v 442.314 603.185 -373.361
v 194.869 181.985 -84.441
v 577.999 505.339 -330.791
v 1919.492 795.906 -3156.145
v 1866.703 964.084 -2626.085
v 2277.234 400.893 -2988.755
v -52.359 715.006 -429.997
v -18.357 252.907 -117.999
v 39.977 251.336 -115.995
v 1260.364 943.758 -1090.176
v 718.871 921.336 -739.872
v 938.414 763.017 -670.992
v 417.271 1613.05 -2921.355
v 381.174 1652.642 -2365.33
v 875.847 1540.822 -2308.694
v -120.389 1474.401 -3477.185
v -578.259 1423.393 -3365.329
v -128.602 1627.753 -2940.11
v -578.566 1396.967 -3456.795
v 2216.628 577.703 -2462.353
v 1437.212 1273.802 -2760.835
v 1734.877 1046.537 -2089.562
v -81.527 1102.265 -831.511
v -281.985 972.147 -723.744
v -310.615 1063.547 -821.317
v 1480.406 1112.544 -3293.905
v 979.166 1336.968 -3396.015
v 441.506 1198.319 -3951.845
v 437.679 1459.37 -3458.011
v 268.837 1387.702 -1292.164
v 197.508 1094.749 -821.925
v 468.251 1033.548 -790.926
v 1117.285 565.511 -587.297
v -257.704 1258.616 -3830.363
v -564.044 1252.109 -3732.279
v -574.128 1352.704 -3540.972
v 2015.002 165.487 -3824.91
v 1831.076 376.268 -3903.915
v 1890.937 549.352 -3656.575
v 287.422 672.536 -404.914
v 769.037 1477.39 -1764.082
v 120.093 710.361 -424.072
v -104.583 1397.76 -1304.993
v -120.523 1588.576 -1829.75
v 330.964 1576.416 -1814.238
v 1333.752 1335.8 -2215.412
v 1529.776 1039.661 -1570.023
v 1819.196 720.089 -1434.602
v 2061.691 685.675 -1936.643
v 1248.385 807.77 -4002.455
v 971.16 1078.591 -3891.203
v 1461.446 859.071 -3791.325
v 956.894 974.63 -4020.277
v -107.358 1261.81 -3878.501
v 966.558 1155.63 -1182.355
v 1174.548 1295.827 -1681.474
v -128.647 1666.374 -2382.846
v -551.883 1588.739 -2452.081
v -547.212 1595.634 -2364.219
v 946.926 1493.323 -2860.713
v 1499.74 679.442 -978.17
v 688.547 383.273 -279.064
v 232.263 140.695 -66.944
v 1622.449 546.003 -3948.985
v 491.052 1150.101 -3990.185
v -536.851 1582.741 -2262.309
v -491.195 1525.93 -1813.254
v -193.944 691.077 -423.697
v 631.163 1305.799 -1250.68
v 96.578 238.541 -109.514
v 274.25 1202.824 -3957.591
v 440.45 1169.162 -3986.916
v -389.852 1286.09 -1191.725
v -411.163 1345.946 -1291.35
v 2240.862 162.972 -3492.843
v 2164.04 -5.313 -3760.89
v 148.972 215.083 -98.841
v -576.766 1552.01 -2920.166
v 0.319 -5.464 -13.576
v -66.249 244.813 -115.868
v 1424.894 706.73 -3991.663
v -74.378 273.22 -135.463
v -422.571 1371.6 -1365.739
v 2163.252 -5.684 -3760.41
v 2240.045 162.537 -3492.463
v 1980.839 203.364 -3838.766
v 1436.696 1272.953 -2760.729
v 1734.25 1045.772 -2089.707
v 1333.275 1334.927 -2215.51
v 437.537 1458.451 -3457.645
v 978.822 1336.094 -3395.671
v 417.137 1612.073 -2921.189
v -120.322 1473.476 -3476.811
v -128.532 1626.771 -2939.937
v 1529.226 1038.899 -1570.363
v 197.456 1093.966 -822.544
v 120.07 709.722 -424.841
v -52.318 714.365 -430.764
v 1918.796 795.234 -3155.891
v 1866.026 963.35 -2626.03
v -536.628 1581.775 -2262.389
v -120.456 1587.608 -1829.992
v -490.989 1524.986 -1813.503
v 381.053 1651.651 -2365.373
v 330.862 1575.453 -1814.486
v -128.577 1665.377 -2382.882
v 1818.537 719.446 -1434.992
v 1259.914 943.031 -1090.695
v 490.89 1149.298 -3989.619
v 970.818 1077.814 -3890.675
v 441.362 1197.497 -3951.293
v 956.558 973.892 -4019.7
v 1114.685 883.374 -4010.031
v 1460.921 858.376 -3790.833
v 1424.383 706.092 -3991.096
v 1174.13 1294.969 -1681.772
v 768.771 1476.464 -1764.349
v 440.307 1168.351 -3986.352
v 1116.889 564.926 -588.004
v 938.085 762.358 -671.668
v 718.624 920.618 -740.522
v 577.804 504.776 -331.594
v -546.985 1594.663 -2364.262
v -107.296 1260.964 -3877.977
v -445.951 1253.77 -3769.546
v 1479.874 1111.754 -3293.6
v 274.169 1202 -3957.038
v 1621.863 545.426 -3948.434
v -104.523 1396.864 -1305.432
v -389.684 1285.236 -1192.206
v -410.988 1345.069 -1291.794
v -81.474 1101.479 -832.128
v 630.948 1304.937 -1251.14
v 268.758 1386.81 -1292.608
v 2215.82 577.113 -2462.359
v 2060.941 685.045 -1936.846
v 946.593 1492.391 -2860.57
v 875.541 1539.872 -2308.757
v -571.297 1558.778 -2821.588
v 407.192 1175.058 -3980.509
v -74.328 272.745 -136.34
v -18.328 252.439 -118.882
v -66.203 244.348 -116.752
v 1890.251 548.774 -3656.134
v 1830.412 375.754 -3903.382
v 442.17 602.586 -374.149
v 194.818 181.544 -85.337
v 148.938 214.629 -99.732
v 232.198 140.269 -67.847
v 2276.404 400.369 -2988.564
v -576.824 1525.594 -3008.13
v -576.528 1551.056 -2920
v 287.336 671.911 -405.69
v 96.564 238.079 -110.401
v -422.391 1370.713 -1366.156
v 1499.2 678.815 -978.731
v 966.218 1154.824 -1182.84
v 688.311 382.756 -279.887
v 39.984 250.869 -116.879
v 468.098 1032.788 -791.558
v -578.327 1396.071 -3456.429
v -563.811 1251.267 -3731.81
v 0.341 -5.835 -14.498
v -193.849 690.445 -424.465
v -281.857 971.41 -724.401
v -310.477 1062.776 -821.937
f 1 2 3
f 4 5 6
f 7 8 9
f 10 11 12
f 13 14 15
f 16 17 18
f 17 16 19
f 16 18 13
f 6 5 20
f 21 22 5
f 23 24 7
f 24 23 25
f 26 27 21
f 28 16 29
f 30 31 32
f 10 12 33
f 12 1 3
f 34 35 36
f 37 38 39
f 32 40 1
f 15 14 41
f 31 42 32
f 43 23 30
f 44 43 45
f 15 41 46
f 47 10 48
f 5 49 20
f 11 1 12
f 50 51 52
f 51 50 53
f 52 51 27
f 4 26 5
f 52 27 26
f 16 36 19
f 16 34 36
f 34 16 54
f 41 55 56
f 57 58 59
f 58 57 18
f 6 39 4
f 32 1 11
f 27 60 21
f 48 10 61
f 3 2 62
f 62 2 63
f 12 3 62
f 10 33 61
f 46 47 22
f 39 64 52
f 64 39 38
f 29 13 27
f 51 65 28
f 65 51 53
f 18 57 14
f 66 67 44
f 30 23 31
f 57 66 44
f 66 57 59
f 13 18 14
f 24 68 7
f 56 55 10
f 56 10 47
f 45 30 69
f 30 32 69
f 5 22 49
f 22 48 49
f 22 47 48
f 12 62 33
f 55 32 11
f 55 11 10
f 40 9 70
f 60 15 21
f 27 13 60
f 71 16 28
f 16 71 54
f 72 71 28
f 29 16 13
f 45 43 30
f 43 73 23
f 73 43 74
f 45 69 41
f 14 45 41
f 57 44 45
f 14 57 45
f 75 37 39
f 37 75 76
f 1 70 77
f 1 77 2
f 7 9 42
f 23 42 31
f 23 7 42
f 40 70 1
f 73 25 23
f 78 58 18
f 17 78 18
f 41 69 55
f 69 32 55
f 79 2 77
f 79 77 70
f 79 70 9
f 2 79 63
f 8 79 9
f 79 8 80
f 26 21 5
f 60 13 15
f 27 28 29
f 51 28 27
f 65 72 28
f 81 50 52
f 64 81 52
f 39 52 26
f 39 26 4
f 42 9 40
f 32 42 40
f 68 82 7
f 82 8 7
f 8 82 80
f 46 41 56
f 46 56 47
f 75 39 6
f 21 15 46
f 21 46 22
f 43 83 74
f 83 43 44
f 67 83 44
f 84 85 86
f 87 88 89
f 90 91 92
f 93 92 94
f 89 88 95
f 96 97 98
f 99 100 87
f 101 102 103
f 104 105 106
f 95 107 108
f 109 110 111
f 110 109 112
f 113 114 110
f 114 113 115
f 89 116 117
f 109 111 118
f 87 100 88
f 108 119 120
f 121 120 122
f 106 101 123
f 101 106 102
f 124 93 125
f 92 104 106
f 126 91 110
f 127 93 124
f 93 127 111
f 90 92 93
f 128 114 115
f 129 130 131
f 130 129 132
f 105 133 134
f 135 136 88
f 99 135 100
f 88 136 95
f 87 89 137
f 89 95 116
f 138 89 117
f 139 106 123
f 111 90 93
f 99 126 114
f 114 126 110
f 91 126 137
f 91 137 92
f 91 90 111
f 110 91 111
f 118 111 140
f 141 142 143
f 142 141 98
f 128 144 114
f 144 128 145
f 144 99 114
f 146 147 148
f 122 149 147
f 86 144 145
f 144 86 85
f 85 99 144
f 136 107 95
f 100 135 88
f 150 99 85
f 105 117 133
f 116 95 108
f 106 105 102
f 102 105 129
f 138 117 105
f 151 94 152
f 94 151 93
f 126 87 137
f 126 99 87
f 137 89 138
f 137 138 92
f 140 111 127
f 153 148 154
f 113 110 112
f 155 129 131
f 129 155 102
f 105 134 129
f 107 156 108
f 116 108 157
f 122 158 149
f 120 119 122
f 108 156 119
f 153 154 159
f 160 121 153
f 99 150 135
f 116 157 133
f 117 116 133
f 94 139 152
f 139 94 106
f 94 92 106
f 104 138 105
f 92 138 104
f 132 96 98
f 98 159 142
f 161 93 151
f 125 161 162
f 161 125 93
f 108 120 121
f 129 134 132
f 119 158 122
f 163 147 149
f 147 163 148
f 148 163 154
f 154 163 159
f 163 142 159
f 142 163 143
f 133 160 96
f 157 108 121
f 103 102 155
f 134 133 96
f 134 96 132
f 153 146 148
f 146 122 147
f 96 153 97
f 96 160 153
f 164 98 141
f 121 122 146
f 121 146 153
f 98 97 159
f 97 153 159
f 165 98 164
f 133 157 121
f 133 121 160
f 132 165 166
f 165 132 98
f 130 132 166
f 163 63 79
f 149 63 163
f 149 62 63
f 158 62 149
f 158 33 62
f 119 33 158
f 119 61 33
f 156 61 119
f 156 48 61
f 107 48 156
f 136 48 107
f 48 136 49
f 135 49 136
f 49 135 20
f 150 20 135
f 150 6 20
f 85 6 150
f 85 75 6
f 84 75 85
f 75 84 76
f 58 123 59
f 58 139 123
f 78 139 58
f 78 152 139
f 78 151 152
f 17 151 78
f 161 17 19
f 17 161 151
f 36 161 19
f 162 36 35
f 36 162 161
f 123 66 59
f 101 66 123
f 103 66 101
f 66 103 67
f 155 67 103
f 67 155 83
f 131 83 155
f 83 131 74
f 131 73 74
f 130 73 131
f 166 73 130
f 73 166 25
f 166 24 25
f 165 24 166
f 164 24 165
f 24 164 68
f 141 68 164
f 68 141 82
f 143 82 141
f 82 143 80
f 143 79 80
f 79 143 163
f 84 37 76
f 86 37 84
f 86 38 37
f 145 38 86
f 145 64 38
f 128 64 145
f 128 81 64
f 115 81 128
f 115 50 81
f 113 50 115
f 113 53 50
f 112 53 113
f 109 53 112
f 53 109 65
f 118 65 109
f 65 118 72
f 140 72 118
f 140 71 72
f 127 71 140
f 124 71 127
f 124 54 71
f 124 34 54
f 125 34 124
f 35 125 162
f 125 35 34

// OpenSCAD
genRad = 2672;

cs = 4*genRad; // cube side (size)

Genaker();


module Genaker() {

//    rotate([ 0 , -71/2 , 0])
    rotate([ 0 , -60/2 , 0])
    rotate([ 0 , 0 , 40 ])
    rotate([ 0 , 71/2 , 0 ])
    translate([0,0,-genRad])
    difference() {
        
        sphere(r=genRad);
        sphere(r=genRad-1);

        translate([0,-cs/2,0])    
        cube([cs,cs,cs], center=true);
    
    
        rotate([0,0,70])
        translate([0,cs/2,0])    
        cube([cs,cs,cs], center=true);

        rotate([0,109,0])
        translate([cs/2,0,0])    
        cube([cs,cs,cs], center=true);

    }
}
